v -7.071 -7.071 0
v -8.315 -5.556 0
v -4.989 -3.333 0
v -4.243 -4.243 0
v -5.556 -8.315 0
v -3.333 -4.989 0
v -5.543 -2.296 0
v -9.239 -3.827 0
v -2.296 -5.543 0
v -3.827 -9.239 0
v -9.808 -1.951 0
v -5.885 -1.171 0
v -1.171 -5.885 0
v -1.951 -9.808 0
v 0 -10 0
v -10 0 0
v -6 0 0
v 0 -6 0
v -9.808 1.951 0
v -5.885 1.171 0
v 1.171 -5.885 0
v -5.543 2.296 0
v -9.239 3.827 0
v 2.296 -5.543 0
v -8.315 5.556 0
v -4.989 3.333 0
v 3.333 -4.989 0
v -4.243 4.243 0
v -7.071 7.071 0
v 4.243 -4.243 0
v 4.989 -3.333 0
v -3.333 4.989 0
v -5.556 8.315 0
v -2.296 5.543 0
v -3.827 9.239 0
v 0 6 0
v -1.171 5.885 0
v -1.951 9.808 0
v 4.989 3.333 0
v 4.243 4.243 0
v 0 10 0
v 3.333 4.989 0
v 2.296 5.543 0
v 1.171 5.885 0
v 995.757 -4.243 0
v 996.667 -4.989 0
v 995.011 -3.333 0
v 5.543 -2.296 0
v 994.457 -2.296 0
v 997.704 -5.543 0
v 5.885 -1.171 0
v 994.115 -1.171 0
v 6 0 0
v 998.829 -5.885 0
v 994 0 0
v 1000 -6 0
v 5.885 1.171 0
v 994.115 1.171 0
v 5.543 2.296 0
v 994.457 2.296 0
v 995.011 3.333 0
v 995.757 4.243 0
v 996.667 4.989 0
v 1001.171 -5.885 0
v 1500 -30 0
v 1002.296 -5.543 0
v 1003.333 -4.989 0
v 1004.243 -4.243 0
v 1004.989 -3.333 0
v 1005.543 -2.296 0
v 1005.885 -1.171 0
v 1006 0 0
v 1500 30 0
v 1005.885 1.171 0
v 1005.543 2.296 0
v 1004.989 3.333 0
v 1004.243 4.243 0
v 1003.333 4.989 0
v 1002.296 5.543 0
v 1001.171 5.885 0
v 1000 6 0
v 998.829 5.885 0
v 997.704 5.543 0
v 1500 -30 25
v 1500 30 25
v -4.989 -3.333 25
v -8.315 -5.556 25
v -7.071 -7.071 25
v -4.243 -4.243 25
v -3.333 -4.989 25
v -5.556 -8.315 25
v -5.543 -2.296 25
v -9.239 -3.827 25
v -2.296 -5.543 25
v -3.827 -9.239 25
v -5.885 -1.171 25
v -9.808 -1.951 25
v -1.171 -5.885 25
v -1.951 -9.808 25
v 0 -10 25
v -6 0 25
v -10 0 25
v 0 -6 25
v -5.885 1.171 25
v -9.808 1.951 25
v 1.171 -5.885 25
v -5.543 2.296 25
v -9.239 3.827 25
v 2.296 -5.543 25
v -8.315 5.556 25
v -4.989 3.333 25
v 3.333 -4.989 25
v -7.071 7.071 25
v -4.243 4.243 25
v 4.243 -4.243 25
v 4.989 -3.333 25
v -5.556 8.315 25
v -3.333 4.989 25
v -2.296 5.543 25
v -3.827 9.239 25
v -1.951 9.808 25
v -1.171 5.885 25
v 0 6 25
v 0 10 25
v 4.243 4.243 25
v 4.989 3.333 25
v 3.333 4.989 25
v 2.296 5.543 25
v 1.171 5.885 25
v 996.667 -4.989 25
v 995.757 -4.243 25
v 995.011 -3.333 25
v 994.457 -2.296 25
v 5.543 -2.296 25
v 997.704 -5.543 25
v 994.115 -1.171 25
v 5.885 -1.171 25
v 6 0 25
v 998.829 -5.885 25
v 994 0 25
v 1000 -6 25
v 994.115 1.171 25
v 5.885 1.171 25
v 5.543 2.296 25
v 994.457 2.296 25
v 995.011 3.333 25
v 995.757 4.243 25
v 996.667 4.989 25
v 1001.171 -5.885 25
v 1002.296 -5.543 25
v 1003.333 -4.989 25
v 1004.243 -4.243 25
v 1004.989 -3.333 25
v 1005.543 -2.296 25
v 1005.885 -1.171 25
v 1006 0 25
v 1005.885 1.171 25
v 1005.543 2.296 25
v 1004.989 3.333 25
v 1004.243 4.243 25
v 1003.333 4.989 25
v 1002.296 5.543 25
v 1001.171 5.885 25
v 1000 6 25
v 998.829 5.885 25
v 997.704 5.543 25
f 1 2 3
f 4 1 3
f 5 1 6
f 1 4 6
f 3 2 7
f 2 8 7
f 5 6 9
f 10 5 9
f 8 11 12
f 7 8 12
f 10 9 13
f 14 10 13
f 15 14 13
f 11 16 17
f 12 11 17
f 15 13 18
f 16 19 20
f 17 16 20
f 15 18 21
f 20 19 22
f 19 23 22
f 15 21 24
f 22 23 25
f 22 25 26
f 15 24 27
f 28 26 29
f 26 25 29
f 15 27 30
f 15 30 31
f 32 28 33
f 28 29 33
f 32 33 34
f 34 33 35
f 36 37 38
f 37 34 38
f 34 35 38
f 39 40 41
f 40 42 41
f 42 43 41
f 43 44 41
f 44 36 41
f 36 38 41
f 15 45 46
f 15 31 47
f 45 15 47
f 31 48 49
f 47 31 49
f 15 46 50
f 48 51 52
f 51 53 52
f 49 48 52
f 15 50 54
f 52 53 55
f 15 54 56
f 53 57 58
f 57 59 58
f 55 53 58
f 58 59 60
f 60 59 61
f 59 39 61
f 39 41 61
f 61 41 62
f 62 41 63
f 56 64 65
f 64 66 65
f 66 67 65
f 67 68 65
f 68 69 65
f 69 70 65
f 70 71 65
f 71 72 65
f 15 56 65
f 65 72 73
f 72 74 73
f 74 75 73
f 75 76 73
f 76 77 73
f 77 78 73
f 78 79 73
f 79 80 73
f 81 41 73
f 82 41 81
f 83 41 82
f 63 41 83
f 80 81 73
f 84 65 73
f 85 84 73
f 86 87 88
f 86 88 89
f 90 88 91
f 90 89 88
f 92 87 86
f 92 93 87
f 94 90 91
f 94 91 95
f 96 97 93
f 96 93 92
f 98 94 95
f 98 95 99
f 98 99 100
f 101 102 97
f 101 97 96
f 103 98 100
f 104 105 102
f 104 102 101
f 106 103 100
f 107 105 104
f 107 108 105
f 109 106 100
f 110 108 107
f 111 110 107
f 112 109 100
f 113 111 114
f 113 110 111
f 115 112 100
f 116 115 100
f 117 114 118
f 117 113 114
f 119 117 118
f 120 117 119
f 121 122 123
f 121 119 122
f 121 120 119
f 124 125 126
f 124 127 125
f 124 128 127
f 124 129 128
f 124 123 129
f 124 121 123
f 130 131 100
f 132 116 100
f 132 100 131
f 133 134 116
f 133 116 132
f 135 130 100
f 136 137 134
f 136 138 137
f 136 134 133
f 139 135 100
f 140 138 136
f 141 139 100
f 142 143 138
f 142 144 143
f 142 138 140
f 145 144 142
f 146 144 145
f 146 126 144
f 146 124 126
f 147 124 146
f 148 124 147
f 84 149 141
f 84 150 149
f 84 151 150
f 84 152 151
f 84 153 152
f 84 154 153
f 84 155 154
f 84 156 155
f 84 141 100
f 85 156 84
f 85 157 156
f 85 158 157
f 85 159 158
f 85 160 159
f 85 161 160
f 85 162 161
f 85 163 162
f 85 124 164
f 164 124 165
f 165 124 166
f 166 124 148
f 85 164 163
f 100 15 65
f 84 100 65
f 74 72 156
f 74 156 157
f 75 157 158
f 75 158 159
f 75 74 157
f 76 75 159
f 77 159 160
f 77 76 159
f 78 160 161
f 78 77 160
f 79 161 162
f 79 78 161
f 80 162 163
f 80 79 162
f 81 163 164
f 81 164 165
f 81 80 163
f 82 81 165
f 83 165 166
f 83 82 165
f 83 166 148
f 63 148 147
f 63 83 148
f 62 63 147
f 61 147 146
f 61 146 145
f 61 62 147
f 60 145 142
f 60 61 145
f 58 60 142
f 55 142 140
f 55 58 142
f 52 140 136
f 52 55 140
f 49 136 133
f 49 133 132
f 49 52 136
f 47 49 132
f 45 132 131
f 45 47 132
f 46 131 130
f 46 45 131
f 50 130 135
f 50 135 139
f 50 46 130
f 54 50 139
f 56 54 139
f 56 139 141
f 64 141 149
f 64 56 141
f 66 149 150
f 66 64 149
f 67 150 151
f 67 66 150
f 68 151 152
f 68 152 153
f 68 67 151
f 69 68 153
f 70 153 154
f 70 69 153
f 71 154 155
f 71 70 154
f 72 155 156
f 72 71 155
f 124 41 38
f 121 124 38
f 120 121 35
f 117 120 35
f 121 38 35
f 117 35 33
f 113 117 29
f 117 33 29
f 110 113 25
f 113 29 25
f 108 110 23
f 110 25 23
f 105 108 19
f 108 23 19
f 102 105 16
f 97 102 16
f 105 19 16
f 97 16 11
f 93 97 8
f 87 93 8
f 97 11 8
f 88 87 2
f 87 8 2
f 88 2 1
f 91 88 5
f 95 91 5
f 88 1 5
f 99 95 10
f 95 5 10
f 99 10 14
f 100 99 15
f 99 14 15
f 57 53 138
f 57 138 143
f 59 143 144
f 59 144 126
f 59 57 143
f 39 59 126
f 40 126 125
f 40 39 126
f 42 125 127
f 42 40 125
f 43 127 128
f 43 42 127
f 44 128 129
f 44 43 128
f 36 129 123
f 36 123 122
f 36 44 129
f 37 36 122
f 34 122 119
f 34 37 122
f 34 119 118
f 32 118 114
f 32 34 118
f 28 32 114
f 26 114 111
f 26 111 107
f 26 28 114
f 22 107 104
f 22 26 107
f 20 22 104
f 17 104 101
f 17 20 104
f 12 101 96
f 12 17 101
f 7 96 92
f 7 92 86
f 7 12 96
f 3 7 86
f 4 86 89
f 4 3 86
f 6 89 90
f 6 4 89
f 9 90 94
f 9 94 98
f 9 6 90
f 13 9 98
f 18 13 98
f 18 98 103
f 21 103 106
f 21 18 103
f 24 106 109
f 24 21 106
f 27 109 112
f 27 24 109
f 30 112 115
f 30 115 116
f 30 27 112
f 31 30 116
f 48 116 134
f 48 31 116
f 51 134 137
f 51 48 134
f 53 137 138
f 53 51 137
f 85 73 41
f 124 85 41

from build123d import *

# Parameters (mm, degrees)
F0_R     = 6
F1_DEPTH = 25


with BuildPart() as f1:
    # F0 (on Top) → F1 (new body)
    with BuildSketch(Plane.XY):
        with BuildLine():
            ThreePointArc((0, -10), (7.071068, -7.071068), (10, 0))
            ThreePointArc((10, 0), (7.071068, 7.071068), (0, 10))
            ThreePointArc((0, 10), (-10, 0), (0, -10))
        make_face()
        Circle(F0_R, mode=Mode.SUBTRACT)
        with BuildLine():
            ThreePointArc((0, 10), (7.071068, 7.071068), (10, 0))
            ThreePointArc((10, 0), (7.071068, -7.071068), (0, -10))
            Line((0, -10), (1500, -30))
            Line((1500, -30), (1500, 0))
            Line((1500, 0), (1500, 30))
            Line((1500, 30), (0, 10))
        make_face()
        with Locations((1000, 0)):
            Circle(F0_R, mode=Mode.SUBTRACT)
    extrude(amount=F1_DEPTH)


solid = f1.part
